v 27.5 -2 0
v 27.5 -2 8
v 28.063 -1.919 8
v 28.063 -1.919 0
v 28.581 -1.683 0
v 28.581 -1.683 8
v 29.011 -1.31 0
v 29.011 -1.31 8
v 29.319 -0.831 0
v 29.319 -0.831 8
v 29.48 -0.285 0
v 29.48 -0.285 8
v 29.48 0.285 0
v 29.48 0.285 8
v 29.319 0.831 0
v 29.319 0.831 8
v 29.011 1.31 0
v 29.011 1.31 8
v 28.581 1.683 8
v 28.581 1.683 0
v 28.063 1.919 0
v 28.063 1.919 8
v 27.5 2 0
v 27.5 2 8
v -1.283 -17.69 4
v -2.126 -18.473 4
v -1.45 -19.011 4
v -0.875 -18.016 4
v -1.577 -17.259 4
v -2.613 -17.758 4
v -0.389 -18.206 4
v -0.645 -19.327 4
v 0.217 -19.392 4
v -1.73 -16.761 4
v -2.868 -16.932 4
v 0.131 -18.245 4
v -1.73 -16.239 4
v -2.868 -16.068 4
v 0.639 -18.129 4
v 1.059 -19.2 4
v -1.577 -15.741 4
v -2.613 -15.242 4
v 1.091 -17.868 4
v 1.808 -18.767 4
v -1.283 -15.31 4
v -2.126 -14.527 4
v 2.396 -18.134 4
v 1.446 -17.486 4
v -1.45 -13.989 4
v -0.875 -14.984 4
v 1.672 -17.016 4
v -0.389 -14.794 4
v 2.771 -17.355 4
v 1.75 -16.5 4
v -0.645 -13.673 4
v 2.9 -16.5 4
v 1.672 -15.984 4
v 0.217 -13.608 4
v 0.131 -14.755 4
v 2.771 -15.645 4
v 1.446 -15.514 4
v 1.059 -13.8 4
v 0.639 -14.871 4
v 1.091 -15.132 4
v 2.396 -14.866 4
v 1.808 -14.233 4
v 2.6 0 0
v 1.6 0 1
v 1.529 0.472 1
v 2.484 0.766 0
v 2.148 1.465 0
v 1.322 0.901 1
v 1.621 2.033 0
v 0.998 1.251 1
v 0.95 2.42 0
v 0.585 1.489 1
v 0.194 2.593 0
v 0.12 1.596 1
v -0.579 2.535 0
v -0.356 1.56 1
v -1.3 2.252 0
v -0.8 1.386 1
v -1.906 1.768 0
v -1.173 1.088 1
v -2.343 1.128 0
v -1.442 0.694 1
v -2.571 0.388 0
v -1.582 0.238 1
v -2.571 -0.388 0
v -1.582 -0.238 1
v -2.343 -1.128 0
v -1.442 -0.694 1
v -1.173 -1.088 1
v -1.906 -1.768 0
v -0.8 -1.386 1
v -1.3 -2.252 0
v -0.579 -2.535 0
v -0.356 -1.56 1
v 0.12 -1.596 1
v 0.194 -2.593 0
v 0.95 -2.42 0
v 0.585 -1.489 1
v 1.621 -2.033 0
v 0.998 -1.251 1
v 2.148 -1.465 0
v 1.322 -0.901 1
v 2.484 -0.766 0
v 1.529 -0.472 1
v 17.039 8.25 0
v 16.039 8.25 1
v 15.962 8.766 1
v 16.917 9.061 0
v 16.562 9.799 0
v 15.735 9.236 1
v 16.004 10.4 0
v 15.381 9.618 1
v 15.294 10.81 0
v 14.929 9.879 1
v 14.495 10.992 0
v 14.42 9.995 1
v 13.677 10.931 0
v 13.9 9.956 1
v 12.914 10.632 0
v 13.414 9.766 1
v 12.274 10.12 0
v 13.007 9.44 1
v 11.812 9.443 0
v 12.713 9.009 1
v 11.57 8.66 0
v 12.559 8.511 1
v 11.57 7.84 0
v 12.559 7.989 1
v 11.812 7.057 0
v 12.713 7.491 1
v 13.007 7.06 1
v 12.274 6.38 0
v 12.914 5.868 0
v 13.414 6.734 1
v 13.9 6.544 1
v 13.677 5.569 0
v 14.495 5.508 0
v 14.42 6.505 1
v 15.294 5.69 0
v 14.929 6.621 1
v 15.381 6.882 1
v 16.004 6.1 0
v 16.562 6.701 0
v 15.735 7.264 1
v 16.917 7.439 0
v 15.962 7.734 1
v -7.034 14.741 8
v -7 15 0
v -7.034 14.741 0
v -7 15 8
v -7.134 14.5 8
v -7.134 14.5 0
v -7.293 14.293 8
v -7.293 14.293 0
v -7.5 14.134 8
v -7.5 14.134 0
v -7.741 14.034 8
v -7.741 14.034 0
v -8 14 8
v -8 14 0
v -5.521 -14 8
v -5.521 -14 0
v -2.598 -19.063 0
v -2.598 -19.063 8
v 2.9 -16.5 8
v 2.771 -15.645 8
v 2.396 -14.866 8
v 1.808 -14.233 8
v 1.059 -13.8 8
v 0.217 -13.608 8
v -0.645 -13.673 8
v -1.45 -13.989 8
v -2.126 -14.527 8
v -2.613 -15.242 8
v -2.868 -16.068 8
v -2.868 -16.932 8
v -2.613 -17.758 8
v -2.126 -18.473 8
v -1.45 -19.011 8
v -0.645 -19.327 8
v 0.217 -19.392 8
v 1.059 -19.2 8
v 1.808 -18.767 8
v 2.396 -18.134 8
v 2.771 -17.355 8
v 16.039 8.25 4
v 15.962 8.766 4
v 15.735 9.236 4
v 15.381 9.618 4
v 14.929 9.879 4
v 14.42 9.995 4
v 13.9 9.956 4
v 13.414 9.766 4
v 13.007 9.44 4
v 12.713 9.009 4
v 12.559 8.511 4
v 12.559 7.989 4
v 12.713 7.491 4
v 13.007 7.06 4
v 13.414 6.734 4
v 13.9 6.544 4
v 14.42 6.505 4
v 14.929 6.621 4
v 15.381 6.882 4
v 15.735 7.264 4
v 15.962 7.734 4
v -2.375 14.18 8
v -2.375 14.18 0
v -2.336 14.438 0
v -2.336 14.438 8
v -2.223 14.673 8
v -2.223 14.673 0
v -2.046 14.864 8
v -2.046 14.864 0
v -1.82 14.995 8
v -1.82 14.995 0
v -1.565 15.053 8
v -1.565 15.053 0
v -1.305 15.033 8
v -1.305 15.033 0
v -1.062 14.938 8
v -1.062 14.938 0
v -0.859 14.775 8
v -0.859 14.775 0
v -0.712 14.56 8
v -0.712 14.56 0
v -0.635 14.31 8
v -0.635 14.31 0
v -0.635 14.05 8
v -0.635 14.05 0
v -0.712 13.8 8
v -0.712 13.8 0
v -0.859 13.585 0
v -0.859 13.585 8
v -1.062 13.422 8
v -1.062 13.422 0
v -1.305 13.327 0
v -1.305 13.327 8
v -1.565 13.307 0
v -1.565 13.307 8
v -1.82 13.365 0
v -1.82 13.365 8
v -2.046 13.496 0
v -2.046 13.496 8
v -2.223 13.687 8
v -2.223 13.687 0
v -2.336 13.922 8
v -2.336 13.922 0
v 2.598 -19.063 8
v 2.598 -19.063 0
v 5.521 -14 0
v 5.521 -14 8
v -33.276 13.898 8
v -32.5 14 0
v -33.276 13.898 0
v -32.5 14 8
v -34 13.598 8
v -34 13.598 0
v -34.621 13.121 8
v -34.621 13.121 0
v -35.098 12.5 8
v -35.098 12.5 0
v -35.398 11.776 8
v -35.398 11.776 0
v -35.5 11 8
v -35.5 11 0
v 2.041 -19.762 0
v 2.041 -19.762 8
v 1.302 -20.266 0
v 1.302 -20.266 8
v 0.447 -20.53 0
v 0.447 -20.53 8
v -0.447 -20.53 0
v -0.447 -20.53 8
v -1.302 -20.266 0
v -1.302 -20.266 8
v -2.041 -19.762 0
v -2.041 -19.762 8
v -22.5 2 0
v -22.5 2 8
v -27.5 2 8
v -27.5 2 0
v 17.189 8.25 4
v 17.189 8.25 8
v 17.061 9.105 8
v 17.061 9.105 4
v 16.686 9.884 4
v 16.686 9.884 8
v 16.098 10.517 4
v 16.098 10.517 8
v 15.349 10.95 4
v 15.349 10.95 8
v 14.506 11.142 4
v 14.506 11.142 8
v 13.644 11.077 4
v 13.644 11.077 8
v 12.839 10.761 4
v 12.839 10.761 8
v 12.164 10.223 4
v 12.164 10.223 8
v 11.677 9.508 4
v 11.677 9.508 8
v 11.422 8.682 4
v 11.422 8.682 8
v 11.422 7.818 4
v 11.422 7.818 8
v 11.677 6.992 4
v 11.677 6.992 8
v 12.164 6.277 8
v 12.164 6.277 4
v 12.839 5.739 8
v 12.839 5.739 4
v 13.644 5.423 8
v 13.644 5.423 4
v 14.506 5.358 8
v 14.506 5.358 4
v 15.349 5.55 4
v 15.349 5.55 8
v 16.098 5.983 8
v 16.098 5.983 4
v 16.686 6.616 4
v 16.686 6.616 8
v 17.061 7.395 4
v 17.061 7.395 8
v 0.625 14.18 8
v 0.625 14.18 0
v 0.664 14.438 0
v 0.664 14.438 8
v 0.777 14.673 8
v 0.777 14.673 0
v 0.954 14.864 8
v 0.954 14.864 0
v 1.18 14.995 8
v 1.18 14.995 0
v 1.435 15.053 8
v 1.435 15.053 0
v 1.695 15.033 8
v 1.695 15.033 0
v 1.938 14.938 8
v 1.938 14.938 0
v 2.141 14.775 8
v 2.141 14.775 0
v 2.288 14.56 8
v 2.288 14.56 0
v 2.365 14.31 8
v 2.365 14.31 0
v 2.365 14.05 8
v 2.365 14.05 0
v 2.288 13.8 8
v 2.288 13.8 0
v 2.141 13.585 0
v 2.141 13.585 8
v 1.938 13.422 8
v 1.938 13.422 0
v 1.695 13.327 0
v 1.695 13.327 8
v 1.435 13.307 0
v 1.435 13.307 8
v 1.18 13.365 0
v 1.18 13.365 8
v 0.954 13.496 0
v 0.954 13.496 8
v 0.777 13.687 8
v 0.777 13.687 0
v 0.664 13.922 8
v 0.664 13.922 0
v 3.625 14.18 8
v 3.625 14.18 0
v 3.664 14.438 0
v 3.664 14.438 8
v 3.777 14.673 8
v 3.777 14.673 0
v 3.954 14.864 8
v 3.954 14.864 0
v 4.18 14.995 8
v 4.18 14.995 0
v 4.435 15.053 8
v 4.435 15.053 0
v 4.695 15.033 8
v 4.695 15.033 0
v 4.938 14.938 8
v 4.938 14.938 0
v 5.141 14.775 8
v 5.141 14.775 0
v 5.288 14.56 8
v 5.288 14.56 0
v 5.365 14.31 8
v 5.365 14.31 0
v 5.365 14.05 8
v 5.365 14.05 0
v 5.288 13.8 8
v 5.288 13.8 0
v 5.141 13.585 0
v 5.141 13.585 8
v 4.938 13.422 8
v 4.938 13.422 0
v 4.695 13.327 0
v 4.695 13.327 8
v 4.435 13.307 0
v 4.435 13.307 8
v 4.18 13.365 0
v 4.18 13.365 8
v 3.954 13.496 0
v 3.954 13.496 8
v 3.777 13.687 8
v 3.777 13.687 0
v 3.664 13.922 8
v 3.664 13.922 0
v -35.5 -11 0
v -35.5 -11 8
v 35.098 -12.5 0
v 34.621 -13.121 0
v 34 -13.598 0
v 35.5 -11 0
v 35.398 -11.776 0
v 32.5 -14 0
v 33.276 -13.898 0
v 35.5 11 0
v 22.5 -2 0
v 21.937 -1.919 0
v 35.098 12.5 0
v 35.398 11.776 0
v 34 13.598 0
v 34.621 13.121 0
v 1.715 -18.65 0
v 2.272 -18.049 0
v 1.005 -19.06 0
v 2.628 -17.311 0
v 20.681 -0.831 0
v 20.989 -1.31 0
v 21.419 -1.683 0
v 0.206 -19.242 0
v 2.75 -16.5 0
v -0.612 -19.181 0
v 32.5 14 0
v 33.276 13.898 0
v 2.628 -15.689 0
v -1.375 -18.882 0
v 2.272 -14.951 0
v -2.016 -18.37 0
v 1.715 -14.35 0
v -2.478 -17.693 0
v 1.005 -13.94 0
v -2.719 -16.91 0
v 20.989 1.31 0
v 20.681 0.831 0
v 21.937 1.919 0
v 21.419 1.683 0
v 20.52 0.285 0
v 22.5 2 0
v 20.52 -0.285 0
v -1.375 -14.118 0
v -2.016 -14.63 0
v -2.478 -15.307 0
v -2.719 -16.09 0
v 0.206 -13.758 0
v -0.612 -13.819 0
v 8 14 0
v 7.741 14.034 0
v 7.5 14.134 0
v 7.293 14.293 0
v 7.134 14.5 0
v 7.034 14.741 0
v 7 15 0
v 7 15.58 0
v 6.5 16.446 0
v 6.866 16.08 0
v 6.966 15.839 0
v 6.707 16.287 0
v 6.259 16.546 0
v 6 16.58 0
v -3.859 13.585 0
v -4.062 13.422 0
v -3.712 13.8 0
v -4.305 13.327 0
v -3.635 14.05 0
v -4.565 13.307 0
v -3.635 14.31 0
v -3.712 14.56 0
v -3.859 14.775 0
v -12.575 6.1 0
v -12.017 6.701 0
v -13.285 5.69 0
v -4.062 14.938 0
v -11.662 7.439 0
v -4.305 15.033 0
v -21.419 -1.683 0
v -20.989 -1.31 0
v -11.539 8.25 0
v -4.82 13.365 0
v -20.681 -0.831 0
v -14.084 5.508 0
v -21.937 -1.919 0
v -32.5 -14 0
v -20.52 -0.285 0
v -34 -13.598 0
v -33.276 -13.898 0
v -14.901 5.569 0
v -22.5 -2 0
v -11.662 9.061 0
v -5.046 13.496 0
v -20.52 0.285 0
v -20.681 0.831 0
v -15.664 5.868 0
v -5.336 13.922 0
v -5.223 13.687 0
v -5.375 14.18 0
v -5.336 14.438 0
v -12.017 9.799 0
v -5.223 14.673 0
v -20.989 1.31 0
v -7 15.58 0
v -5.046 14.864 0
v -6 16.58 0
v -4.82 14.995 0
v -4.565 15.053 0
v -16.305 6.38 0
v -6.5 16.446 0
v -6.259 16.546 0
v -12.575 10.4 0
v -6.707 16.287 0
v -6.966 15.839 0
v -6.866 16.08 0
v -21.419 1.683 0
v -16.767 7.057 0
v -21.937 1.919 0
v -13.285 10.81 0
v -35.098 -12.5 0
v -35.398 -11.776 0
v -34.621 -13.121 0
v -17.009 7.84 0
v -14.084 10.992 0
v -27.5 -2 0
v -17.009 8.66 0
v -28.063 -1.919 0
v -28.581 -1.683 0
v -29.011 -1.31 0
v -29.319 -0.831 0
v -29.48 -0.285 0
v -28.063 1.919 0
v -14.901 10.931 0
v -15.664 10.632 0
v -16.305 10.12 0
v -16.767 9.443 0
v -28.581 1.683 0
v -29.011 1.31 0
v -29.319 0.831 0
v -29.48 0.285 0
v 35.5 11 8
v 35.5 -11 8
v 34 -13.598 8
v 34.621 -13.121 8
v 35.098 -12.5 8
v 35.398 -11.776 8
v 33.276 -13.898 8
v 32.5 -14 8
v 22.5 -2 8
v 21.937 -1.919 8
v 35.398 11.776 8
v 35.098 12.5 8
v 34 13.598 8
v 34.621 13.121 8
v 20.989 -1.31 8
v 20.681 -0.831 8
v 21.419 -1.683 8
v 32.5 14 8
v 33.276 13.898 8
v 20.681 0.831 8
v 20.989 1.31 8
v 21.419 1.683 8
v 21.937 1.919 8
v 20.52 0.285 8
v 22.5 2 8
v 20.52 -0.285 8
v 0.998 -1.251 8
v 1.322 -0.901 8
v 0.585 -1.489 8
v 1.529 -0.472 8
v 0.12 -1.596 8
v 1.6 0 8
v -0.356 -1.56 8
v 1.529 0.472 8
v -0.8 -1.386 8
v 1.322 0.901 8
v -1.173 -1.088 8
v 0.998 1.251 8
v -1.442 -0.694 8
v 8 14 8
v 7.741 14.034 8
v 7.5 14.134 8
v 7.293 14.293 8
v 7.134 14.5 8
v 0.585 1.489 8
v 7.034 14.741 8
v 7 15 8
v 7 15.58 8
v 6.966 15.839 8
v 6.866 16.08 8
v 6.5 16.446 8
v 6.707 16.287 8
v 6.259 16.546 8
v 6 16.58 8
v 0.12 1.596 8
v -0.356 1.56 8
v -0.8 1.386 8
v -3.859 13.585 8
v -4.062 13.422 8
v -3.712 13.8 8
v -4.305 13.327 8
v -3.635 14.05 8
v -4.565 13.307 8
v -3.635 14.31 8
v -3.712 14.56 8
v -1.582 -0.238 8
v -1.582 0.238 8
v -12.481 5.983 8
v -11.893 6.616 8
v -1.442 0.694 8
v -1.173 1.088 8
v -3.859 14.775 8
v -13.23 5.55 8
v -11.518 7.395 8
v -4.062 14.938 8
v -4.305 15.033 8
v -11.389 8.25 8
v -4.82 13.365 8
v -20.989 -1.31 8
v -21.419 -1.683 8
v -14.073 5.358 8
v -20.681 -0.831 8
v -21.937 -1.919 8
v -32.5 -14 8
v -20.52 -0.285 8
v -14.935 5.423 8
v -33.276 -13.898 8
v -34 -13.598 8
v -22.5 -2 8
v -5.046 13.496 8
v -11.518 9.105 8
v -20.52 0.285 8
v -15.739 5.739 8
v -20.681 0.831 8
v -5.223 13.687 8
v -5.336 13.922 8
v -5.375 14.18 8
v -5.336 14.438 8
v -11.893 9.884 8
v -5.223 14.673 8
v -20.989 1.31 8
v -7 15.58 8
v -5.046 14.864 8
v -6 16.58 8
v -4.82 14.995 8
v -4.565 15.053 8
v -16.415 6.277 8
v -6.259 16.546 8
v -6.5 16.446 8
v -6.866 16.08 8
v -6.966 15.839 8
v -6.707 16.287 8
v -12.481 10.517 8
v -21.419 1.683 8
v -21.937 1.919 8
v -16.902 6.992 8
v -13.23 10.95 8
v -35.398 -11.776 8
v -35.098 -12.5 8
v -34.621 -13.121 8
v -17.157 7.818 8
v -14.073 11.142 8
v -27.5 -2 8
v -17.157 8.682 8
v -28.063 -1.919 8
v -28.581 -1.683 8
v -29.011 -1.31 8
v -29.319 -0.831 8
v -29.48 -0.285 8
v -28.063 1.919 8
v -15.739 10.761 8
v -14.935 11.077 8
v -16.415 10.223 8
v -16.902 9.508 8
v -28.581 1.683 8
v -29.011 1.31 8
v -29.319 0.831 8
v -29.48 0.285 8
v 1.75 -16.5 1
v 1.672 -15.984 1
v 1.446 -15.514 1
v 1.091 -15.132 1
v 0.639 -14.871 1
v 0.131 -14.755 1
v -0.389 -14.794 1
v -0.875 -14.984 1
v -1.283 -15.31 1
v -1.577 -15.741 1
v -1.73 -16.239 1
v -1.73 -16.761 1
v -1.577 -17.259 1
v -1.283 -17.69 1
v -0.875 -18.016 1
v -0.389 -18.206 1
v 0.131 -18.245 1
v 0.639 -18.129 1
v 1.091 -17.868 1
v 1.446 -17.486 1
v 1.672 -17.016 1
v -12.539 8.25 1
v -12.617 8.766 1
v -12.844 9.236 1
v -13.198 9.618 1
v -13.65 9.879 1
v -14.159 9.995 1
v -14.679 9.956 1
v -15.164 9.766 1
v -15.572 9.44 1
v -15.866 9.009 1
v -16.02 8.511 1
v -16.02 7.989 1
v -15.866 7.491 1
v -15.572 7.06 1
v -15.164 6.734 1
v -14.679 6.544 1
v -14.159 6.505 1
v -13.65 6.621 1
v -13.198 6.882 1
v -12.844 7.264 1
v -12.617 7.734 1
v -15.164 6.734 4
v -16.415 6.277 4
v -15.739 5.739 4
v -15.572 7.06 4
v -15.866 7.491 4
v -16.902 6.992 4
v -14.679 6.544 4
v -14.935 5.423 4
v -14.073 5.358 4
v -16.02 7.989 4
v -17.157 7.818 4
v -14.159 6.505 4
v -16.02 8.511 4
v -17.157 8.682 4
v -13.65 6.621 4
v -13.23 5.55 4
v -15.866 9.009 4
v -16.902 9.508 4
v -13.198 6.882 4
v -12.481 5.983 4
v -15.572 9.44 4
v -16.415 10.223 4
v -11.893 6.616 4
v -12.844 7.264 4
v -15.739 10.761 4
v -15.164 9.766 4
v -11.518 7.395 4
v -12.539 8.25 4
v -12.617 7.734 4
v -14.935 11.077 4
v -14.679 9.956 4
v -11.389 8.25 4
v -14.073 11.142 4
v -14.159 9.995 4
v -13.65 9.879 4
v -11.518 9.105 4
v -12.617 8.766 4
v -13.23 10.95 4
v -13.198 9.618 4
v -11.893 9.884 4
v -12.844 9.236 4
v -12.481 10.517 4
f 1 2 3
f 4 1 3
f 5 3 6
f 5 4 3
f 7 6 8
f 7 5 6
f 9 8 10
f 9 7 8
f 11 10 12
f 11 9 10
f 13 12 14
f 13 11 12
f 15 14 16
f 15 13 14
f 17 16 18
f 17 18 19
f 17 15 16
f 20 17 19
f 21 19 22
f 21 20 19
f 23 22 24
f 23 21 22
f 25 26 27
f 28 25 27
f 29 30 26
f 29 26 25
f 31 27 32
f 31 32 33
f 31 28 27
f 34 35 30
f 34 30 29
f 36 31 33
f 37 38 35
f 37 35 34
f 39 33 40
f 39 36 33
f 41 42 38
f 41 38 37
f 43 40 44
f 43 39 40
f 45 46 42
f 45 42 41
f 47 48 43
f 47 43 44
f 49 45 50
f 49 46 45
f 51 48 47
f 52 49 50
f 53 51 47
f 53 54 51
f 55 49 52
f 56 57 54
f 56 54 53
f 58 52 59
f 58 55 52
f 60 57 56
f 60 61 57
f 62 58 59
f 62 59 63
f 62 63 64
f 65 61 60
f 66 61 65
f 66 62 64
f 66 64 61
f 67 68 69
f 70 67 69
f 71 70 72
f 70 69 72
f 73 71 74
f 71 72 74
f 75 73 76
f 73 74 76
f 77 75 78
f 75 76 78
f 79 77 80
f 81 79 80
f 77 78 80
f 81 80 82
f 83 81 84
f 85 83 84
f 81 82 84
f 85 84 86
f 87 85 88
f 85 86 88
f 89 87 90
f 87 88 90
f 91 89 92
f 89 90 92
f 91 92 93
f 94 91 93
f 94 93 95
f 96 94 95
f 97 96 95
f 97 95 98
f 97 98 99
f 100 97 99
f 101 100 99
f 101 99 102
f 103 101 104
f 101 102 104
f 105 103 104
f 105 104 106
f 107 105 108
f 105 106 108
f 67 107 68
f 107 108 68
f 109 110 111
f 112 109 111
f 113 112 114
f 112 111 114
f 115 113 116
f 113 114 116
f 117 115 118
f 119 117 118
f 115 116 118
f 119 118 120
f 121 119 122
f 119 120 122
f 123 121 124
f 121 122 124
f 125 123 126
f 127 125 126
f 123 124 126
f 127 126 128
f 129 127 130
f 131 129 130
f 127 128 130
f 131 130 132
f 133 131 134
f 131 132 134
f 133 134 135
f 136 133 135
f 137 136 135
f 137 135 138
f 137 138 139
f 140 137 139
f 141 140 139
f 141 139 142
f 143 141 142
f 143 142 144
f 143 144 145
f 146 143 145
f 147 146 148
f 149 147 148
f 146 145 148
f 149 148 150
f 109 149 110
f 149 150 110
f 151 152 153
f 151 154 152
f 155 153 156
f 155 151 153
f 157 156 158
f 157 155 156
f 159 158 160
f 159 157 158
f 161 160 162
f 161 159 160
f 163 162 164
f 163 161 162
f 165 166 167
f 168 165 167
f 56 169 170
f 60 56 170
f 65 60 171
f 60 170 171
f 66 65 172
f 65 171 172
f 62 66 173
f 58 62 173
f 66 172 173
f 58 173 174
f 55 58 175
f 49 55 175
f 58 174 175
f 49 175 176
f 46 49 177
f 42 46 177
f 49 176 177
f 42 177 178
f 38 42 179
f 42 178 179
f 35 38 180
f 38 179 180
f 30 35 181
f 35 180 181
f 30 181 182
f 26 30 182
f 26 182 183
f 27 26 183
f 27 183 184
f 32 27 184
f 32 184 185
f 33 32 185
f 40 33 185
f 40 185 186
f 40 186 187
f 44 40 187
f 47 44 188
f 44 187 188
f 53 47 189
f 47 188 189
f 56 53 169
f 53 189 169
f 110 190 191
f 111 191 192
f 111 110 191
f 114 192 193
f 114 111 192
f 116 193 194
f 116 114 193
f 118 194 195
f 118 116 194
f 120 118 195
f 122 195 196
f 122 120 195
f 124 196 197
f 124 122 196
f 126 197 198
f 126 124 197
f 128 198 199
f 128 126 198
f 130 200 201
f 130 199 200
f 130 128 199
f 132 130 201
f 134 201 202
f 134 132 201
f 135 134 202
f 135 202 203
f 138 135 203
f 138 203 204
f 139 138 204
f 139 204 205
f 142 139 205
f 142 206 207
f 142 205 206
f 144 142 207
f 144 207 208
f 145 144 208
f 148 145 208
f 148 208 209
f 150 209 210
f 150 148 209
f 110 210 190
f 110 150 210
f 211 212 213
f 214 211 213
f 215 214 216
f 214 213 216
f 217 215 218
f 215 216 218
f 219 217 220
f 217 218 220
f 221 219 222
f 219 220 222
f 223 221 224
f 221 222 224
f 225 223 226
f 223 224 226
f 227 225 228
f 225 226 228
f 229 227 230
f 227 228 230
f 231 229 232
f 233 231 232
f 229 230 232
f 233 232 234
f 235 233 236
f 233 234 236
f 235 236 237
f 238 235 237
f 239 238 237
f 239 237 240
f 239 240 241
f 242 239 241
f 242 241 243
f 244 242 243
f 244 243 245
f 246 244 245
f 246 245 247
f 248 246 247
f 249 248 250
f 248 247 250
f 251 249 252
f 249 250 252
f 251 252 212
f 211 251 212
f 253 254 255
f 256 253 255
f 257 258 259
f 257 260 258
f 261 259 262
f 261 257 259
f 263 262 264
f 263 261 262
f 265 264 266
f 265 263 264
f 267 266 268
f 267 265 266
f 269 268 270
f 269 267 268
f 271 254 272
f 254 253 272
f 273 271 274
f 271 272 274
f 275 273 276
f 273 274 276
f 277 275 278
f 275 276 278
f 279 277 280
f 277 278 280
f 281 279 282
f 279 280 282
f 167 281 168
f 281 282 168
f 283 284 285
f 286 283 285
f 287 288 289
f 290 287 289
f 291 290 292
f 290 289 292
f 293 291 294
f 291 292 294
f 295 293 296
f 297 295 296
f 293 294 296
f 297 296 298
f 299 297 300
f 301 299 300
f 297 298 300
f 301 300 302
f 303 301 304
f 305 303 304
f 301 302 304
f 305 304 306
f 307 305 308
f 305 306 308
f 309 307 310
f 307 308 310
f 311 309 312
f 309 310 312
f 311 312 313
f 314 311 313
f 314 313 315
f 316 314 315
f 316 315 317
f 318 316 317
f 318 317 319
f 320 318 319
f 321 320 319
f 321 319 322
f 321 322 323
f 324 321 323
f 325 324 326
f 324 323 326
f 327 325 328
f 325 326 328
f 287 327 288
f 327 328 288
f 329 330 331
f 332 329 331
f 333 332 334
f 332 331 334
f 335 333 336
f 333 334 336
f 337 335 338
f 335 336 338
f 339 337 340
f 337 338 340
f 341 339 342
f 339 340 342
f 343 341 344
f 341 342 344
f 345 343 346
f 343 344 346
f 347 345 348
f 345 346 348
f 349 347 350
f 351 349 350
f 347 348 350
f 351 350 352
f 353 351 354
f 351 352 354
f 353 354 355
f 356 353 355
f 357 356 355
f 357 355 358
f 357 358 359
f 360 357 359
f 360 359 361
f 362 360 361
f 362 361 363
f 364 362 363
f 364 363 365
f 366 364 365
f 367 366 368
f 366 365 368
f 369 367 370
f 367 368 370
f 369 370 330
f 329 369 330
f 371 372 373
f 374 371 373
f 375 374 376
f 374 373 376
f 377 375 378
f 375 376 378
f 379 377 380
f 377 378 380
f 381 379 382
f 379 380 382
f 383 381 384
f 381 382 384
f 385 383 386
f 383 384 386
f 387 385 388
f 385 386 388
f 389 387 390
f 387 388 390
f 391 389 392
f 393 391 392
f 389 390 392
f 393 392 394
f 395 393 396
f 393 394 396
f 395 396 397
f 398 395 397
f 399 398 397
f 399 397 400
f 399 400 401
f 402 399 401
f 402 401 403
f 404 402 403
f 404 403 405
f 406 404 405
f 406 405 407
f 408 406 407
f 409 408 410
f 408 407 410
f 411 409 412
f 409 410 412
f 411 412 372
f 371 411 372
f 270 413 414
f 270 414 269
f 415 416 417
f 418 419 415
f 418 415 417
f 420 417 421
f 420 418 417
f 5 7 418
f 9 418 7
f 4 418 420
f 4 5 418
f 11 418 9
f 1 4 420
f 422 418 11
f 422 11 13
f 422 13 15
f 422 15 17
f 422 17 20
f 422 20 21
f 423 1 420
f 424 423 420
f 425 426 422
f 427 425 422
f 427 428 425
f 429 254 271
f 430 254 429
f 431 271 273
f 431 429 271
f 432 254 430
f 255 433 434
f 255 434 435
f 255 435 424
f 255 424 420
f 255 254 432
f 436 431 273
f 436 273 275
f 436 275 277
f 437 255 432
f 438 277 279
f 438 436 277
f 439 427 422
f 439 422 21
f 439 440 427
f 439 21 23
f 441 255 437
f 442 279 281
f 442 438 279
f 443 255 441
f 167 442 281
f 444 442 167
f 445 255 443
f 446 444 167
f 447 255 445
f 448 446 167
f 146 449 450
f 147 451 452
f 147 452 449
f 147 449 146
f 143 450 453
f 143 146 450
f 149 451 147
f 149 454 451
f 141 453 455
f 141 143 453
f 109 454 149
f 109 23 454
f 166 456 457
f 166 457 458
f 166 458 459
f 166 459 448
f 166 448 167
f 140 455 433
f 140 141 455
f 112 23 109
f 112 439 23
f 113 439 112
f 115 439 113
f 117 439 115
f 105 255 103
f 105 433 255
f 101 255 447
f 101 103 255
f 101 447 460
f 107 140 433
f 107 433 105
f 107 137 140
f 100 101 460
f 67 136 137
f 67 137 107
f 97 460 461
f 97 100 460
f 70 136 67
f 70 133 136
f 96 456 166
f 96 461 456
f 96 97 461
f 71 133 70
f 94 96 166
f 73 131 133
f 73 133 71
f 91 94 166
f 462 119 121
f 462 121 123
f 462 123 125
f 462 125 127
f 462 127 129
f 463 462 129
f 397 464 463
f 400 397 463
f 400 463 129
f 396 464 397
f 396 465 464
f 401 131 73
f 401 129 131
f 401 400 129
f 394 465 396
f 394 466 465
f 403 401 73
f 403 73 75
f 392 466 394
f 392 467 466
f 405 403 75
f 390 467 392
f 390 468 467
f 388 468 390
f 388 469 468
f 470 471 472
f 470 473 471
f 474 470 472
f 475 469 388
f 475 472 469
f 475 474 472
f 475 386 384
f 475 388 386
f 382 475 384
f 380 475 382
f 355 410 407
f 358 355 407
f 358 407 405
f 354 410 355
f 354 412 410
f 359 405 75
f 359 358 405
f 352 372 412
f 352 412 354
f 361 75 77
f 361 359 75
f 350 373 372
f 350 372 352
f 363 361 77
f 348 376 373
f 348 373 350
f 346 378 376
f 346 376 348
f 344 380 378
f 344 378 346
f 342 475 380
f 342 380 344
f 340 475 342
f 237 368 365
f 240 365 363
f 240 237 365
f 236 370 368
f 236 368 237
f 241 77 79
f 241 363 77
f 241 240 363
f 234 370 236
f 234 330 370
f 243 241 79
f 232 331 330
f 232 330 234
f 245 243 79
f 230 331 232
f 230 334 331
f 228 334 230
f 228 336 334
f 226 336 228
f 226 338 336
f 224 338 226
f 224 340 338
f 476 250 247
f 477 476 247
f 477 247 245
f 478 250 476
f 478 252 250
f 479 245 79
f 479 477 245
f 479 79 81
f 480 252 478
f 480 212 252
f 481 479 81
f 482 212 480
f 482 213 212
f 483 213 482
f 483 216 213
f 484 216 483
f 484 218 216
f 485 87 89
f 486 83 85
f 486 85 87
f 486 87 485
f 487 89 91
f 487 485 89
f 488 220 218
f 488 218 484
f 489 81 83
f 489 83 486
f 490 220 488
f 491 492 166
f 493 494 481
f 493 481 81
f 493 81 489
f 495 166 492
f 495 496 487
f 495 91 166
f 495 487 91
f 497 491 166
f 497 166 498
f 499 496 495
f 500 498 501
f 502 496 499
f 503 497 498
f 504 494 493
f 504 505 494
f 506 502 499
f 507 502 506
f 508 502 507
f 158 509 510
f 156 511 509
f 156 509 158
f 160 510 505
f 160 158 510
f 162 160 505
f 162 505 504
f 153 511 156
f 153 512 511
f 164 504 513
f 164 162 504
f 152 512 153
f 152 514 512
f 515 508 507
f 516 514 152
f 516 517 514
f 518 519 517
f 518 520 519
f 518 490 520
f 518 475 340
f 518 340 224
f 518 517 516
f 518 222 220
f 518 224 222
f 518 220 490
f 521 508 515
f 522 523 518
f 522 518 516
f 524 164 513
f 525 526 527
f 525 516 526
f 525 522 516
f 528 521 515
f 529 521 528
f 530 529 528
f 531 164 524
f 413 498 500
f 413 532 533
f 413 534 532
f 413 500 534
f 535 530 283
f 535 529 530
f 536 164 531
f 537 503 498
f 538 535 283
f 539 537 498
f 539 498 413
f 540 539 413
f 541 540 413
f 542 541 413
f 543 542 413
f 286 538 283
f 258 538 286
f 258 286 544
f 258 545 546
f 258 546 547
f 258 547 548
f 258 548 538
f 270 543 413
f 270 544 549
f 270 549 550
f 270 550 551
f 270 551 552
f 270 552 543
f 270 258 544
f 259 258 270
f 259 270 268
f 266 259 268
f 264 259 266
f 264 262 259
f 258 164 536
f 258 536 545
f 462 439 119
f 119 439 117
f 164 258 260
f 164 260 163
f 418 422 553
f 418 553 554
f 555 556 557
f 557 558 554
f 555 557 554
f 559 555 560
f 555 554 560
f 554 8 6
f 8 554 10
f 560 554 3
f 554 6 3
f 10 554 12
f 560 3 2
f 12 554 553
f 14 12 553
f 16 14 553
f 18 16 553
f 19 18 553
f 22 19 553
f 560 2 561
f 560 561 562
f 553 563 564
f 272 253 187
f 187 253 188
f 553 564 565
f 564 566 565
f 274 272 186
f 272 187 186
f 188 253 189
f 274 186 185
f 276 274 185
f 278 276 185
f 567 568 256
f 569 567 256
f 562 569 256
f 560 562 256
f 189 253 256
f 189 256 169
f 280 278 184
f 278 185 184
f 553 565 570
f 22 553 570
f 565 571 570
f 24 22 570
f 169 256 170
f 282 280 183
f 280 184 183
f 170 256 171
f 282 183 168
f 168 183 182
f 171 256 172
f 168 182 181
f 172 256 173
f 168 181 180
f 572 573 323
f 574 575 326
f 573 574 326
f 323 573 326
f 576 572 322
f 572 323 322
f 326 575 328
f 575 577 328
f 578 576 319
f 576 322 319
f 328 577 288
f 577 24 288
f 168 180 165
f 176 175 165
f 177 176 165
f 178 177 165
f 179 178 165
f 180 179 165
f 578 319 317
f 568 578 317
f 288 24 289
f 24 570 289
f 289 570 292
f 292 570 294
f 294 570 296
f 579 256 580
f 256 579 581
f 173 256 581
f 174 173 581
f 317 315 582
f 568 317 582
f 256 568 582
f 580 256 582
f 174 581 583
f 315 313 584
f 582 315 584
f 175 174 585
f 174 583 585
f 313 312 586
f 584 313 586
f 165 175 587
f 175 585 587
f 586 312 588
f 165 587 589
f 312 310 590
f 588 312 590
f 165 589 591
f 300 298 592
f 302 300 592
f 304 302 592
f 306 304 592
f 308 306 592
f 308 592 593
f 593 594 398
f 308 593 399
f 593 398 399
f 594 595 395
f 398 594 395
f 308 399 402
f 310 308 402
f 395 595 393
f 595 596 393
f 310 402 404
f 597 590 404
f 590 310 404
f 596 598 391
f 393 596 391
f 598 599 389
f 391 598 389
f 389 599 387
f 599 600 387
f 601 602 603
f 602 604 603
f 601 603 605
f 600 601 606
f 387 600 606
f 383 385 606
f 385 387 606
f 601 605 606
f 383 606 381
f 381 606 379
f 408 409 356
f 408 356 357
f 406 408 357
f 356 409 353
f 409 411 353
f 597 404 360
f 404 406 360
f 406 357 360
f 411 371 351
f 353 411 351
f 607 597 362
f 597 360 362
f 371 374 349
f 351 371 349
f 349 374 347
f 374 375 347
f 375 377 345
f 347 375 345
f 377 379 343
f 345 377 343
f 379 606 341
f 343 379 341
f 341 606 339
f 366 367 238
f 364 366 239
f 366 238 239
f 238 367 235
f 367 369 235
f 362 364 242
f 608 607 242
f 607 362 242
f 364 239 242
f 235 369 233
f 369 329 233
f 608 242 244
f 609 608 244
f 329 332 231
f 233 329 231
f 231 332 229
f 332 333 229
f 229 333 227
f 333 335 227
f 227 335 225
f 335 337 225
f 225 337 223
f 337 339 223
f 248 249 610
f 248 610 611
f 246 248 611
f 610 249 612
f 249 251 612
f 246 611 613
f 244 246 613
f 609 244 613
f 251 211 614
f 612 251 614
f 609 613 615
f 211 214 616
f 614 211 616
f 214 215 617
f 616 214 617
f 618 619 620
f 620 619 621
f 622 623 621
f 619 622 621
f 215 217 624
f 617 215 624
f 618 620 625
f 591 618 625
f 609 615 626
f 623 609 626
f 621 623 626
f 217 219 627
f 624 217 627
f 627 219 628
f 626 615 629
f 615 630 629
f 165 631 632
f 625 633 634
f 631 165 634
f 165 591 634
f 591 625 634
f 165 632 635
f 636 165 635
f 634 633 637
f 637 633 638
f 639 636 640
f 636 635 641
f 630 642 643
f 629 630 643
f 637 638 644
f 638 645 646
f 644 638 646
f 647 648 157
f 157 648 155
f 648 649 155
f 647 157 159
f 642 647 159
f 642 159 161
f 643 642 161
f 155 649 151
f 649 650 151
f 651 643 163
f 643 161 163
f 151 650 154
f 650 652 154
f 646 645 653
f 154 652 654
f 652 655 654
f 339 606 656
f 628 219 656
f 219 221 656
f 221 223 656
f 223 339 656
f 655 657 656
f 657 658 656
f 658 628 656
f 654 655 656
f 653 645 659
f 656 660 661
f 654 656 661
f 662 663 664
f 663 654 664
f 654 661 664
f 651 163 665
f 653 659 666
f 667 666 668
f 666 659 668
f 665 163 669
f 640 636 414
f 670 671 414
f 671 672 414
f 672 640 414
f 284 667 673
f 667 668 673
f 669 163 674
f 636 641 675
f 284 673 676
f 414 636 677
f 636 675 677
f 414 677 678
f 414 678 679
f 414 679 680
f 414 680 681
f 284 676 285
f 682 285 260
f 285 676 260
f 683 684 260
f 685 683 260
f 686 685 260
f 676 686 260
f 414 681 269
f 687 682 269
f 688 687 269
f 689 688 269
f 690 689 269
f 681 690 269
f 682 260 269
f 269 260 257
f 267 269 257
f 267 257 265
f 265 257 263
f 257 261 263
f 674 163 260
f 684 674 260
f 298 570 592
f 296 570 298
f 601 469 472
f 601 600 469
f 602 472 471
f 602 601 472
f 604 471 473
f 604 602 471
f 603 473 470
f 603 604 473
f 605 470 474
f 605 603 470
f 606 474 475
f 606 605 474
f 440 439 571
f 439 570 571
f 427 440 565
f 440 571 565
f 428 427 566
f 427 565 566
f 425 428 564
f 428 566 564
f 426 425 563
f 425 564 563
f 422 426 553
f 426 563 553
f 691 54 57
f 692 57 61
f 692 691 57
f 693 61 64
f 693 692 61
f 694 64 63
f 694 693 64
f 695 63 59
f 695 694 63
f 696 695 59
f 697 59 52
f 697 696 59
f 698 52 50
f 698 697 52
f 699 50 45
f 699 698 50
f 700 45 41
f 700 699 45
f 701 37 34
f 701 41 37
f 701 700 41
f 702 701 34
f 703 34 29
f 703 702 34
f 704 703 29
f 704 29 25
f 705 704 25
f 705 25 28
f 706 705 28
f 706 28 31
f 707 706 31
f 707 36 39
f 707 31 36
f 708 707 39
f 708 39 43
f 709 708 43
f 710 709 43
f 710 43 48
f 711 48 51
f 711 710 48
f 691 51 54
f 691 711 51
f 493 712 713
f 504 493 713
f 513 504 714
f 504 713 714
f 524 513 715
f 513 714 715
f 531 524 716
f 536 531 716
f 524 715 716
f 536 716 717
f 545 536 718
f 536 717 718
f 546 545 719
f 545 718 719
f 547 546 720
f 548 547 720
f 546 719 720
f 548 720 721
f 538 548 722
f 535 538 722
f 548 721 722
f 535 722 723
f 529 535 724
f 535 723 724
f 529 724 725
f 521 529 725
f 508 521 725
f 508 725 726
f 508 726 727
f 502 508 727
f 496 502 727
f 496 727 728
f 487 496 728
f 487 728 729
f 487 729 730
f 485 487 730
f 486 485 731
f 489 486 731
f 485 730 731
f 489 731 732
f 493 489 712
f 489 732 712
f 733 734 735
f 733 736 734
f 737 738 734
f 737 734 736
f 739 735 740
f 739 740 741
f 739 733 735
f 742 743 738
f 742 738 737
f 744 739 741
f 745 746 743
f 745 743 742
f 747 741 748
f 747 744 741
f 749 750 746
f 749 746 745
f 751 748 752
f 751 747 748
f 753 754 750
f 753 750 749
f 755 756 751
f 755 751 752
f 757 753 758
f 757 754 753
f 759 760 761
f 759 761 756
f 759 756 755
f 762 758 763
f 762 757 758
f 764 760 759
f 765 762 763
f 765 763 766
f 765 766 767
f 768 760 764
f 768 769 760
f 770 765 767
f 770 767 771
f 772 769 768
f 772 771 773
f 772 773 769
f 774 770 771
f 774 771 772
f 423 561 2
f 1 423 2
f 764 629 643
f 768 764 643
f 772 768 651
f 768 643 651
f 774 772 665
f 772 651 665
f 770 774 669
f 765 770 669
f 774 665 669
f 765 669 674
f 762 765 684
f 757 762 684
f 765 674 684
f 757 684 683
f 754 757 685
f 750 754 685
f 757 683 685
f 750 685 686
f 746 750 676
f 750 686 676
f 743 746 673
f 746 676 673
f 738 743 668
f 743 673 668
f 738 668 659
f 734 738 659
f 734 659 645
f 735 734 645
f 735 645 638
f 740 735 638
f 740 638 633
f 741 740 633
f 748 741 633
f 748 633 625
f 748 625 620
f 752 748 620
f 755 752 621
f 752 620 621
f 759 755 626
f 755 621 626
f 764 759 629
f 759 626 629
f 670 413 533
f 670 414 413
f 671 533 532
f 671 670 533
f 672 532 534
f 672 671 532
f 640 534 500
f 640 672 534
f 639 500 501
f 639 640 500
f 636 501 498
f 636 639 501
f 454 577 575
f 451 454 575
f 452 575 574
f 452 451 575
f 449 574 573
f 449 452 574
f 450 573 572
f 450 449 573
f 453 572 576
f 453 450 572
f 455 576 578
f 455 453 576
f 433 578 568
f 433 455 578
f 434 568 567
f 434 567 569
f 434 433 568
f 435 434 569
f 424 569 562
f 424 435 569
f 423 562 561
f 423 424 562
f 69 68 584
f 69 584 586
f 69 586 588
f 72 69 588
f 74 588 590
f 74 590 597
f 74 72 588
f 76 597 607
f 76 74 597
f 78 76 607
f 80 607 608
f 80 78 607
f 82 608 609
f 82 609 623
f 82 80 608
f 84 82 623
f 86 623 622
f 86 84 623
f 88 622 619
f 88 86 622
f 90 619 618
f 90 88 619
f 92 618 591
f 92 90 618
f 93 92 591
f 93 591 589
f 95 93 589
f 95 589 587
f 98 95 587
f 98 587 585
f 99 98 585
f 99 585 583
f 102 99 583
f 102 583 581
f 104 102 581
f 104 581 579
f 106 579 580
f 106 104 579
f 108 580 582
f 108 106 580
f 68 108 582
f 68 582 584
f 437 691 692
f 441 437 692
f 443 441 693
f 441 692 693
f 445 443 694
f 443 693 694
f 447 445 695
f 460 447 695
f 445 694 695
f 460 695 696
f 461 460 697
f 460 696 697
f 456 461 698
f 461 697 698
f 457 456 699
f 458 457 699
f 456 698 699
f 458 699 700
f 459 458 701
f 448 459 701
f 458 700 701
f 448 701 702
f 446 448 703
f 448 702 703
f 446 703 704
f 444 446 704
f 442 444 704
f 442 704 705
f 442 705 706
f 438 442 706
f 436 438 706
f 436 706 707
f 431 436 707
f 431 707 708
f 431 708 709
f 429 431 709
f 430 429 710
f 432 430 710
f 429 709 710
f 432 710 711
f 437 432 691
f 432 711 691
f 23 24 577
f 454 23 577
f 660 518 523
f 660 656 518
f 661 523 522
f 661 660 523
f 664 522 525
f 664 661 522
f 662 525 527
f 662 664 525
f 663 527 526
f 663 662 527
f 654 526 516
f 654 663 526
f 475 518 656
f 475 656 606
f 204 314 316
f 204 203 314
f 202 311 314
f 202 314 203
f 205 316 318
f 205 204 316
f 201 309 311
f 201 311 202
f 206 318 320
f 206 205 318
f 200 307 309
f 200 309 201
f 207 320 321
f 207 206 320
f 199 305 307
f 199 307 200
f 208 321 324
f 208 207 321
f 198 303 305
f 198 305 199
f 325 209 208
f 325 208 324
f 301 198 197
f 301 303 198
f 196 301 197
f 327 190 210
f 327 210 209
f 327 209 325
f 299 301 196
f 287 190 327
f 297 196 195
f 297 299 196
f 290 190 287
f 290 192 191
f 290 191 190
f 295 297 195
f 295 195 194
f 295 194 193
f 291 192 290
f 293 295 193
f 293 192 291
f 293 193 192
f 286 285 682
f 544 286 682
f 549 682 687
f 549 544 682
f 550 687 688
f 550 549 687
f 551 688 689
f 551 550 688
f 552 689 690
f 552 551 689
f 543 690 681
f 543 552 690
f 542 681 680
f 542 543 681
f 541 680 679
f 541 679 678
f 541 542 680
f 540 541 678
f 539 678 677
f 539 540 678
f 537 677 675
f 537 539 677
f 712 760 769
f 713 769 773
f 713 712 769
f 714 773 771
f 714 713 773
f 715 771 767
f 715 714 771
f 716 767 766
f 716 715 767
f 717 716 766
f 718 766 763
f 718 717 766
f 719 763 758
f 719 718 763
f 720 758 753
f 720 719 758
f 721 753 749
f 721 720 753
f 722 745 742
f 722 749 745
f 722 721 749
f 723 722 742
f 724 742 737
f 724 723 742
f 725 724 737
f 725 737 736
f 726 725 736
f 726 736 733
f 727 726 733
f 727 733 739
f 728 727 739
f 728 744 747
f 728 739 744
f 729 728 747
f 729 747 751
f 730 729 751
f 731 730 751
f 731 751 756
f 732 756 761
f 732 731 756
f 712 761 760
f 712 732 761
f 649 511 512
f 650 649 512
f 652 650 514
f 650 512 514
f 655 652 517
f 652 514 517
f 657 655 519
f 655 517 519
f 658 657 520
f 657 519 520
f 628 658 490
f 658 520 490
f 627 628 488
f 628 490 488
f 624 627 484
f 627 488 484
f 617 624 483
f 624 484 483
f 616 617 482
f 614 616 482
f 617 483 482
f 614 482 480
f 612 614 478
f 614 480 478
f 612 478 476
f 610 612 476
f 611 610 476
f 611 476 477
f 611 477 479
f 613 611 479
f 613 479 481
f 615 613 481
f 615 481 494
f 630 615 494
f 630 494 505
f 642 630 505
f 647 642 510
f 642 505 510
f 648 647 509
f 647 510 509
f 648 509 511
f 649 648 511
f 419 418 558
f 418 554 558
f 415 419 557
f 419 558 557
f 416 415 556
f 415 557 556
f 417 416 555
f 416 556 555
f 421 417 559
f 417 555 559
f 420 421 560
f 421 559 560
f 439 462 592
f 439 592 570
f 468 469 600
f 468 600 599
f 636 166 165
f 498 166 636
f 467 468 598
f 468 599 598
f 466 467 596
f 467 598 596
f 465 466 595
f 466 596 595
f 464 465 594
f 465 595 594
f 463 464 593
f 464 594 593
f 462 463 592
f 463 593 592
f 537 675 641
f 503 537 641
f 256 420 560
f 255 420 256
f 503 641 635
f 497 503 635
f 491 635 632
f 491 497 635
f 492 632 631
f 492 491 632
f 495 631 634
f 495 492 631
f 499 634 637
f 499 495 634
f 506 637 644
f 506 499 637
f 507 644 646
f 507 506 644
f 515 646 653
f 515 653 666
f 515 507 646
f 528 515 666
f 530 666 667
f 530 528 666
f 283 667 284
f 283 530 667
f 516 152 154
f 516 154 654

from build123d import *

# Parameters (mm, degrees)
MODEL_R             = 1.7499965
MODEL_R_2           = 1.6
BOSS_EXTRUDE1_DEPTH = 8
FILLET1_R           = 3
SKETCH1_R           = 0.875
SKETCH1_R_2         = 1.7499965
SKETCH1_R_3         = 1.6
BOSS_EXTRUDE2_DEPTH = 8
FILLET2_R           = 1
FILLET3_R           = 3
SKETCH2_R           = 2.9
CUT_EXTRUDE1_DEPTH  = 4
CHAMFER1_SIZE       = 1


with BuildPart() as part:
    # Model → Boss-Extrude1 (new body)
    with BuildSketch(Plane.XY):
        Polygon((20.40532142, 11.78), (-20.40532142, 11.78), (0, -23.563053444), align=None)
        with Locations((0, -16.5)):
            Circle(MODEL_R, mode=Mode.SUBTRACT)
        Circle(MODEL_R_2, mode=Mode.SUBTRACT)
        with Locations((-14.289419163, 8.25)):
            Circle(MODEL_R, mode=Mode.SUBTRACT)
        with Locations((14.289419163, 8.25)):
            Circle(MODEL_R, mode=Mode.SUBTRACT)
    extrude(amount=BOSS_EXTRUDE1_DEPTH)

    # Fillet1
    fillet1_edges = [part.edges().sort_by_distance(p)[0] for p in [
        (0, -23.563053444, 4),
        (-20.40532142, 11.78, 4),
        (20.40532142, 11.78, 4),
    ]]
    fillet(fillet1_edges, radius=FILLET1_R)

    # Sketch1 → Boss-Extrude2 (add)
    with BuildSketch(Plane(origin=(0, 0, 0), x_dir=(-1, 0, 0), z_dir=(0, 0, -1))):
        Polygon((-7, 16.58), (-7, 14), (-35.5, 14), (-35.5, -14), (-5.52123148, -14), (5.52123148, -14), (35.5, -14), (35.5, 14), (7, 14), (7, 16.58), align=None)
        with Locations((-1.5, 14.18)):
            Circle(SKETCH1_R, mode=Mode.SUBTRACT)
        with Locations((-4.5, 14.18)):
            Circle(SKETCH1_R, mode=Mode.SUBTRACT)
        with Locations((1.5, 14.18)):
            Circle(SKETCH1_R, mode=Mode.SUBTRACT)
        with Locations((4.5, 14.18)):
            Circle(SKETCH1_R, mode=Mode.SUBTRACT)
        with Locations(Location((-14.289419163, 8.25, 0), (0, 0, 180))):
            Circle(SKETCH1_R_2, mode=Mode.SUBTRACT)
        with Locations(Location((14.289419163, 8.25, 0), (0, 0, 180))):
            Circle(SKETCH1_R_2, mode=Mode.SUBTRACT)
        with Locations(Location((0, 0, 0), (0, 0, 180))):
            Circle(SKETCH1_R_3, mode=Mode.SUBTRACT)
        with BuildLine():
            Line((-27.5, 2), (-22.5, 2))
            ThreePointArc((-22.5, 2), (-20.5, 0), (-22.5, -2))
            Line((-22.5, -2), (-27.5, -2))
            ThreePointArc((-27.5, -2), (-29.5, 0), (-27.5, 2))
        make_face(mode=Mode.SUBTRACT)
        with BuildLine():
            Line((22.5, 2), (27.5, 2))
            ThreePointArc((27.5, 2), (29.5, 0), (27.5, -2))
            Line((27.5, -2), (22.5, -2))
            ThreePointArc((22.5, -2), (20.5, 0), (22.5, 2))
        make_face(mode=Mode.SUBTRACT)
    extrude(amount=-BOSS_EXTRUDE2_DEPTH)

    # Fillet2
    fillet2_edges = [part.edges().sort_by_distance(p)[0] for p in [
        (7, 16.58, 4),
        (-7, 16.58, 4),
        (-7, 14, 4),
        (7, 14, 4),
    ]]
    fillet(fillet2_edges, radius=FILLET2_R)

    # Fillet3
    fillet3_edges = [part.edges().sort_by_distance(p)[0] for p in [
        (-35.5, -14, 4),
        (-35.5, 14, 4),
        (35.5, -14, 4),
        (35.5, 14, 4),
    ]]
    fillet(fillet3_edges, radius=FILLET3_R)

    # Sketch2 → Cut-Extrude1 (cut)
    with BuildSketch(Plane.XY.offset(8)):
        with Locations((-14.289419163, 8.25)):
            Circle(SKETCH2_R)
        with Locations((14.289419163, 8.25)):
            Circle(SKETCH2_R)
        with Locations((0, -16.5)):
            Circle(SKETCH2_R)
    extrude(amount=-CUT_EXTRUDE1_DEPTH, mode=Mode.SUBTRACT)

    # Chamfer1
    chamfer1_edges = [part.edges().sort_by_distance(p)[0] for p in [
        (-1.6, 0, 0),
        (-16.039415663, 8.25, 0),
        (12.539422663, 8.25, 0),
        (-1.7499965, -16.5, 0),
    ]]
    chamfer(chamfer1_edges, length=CHAMFER1_SIZE)


solid = part.part
